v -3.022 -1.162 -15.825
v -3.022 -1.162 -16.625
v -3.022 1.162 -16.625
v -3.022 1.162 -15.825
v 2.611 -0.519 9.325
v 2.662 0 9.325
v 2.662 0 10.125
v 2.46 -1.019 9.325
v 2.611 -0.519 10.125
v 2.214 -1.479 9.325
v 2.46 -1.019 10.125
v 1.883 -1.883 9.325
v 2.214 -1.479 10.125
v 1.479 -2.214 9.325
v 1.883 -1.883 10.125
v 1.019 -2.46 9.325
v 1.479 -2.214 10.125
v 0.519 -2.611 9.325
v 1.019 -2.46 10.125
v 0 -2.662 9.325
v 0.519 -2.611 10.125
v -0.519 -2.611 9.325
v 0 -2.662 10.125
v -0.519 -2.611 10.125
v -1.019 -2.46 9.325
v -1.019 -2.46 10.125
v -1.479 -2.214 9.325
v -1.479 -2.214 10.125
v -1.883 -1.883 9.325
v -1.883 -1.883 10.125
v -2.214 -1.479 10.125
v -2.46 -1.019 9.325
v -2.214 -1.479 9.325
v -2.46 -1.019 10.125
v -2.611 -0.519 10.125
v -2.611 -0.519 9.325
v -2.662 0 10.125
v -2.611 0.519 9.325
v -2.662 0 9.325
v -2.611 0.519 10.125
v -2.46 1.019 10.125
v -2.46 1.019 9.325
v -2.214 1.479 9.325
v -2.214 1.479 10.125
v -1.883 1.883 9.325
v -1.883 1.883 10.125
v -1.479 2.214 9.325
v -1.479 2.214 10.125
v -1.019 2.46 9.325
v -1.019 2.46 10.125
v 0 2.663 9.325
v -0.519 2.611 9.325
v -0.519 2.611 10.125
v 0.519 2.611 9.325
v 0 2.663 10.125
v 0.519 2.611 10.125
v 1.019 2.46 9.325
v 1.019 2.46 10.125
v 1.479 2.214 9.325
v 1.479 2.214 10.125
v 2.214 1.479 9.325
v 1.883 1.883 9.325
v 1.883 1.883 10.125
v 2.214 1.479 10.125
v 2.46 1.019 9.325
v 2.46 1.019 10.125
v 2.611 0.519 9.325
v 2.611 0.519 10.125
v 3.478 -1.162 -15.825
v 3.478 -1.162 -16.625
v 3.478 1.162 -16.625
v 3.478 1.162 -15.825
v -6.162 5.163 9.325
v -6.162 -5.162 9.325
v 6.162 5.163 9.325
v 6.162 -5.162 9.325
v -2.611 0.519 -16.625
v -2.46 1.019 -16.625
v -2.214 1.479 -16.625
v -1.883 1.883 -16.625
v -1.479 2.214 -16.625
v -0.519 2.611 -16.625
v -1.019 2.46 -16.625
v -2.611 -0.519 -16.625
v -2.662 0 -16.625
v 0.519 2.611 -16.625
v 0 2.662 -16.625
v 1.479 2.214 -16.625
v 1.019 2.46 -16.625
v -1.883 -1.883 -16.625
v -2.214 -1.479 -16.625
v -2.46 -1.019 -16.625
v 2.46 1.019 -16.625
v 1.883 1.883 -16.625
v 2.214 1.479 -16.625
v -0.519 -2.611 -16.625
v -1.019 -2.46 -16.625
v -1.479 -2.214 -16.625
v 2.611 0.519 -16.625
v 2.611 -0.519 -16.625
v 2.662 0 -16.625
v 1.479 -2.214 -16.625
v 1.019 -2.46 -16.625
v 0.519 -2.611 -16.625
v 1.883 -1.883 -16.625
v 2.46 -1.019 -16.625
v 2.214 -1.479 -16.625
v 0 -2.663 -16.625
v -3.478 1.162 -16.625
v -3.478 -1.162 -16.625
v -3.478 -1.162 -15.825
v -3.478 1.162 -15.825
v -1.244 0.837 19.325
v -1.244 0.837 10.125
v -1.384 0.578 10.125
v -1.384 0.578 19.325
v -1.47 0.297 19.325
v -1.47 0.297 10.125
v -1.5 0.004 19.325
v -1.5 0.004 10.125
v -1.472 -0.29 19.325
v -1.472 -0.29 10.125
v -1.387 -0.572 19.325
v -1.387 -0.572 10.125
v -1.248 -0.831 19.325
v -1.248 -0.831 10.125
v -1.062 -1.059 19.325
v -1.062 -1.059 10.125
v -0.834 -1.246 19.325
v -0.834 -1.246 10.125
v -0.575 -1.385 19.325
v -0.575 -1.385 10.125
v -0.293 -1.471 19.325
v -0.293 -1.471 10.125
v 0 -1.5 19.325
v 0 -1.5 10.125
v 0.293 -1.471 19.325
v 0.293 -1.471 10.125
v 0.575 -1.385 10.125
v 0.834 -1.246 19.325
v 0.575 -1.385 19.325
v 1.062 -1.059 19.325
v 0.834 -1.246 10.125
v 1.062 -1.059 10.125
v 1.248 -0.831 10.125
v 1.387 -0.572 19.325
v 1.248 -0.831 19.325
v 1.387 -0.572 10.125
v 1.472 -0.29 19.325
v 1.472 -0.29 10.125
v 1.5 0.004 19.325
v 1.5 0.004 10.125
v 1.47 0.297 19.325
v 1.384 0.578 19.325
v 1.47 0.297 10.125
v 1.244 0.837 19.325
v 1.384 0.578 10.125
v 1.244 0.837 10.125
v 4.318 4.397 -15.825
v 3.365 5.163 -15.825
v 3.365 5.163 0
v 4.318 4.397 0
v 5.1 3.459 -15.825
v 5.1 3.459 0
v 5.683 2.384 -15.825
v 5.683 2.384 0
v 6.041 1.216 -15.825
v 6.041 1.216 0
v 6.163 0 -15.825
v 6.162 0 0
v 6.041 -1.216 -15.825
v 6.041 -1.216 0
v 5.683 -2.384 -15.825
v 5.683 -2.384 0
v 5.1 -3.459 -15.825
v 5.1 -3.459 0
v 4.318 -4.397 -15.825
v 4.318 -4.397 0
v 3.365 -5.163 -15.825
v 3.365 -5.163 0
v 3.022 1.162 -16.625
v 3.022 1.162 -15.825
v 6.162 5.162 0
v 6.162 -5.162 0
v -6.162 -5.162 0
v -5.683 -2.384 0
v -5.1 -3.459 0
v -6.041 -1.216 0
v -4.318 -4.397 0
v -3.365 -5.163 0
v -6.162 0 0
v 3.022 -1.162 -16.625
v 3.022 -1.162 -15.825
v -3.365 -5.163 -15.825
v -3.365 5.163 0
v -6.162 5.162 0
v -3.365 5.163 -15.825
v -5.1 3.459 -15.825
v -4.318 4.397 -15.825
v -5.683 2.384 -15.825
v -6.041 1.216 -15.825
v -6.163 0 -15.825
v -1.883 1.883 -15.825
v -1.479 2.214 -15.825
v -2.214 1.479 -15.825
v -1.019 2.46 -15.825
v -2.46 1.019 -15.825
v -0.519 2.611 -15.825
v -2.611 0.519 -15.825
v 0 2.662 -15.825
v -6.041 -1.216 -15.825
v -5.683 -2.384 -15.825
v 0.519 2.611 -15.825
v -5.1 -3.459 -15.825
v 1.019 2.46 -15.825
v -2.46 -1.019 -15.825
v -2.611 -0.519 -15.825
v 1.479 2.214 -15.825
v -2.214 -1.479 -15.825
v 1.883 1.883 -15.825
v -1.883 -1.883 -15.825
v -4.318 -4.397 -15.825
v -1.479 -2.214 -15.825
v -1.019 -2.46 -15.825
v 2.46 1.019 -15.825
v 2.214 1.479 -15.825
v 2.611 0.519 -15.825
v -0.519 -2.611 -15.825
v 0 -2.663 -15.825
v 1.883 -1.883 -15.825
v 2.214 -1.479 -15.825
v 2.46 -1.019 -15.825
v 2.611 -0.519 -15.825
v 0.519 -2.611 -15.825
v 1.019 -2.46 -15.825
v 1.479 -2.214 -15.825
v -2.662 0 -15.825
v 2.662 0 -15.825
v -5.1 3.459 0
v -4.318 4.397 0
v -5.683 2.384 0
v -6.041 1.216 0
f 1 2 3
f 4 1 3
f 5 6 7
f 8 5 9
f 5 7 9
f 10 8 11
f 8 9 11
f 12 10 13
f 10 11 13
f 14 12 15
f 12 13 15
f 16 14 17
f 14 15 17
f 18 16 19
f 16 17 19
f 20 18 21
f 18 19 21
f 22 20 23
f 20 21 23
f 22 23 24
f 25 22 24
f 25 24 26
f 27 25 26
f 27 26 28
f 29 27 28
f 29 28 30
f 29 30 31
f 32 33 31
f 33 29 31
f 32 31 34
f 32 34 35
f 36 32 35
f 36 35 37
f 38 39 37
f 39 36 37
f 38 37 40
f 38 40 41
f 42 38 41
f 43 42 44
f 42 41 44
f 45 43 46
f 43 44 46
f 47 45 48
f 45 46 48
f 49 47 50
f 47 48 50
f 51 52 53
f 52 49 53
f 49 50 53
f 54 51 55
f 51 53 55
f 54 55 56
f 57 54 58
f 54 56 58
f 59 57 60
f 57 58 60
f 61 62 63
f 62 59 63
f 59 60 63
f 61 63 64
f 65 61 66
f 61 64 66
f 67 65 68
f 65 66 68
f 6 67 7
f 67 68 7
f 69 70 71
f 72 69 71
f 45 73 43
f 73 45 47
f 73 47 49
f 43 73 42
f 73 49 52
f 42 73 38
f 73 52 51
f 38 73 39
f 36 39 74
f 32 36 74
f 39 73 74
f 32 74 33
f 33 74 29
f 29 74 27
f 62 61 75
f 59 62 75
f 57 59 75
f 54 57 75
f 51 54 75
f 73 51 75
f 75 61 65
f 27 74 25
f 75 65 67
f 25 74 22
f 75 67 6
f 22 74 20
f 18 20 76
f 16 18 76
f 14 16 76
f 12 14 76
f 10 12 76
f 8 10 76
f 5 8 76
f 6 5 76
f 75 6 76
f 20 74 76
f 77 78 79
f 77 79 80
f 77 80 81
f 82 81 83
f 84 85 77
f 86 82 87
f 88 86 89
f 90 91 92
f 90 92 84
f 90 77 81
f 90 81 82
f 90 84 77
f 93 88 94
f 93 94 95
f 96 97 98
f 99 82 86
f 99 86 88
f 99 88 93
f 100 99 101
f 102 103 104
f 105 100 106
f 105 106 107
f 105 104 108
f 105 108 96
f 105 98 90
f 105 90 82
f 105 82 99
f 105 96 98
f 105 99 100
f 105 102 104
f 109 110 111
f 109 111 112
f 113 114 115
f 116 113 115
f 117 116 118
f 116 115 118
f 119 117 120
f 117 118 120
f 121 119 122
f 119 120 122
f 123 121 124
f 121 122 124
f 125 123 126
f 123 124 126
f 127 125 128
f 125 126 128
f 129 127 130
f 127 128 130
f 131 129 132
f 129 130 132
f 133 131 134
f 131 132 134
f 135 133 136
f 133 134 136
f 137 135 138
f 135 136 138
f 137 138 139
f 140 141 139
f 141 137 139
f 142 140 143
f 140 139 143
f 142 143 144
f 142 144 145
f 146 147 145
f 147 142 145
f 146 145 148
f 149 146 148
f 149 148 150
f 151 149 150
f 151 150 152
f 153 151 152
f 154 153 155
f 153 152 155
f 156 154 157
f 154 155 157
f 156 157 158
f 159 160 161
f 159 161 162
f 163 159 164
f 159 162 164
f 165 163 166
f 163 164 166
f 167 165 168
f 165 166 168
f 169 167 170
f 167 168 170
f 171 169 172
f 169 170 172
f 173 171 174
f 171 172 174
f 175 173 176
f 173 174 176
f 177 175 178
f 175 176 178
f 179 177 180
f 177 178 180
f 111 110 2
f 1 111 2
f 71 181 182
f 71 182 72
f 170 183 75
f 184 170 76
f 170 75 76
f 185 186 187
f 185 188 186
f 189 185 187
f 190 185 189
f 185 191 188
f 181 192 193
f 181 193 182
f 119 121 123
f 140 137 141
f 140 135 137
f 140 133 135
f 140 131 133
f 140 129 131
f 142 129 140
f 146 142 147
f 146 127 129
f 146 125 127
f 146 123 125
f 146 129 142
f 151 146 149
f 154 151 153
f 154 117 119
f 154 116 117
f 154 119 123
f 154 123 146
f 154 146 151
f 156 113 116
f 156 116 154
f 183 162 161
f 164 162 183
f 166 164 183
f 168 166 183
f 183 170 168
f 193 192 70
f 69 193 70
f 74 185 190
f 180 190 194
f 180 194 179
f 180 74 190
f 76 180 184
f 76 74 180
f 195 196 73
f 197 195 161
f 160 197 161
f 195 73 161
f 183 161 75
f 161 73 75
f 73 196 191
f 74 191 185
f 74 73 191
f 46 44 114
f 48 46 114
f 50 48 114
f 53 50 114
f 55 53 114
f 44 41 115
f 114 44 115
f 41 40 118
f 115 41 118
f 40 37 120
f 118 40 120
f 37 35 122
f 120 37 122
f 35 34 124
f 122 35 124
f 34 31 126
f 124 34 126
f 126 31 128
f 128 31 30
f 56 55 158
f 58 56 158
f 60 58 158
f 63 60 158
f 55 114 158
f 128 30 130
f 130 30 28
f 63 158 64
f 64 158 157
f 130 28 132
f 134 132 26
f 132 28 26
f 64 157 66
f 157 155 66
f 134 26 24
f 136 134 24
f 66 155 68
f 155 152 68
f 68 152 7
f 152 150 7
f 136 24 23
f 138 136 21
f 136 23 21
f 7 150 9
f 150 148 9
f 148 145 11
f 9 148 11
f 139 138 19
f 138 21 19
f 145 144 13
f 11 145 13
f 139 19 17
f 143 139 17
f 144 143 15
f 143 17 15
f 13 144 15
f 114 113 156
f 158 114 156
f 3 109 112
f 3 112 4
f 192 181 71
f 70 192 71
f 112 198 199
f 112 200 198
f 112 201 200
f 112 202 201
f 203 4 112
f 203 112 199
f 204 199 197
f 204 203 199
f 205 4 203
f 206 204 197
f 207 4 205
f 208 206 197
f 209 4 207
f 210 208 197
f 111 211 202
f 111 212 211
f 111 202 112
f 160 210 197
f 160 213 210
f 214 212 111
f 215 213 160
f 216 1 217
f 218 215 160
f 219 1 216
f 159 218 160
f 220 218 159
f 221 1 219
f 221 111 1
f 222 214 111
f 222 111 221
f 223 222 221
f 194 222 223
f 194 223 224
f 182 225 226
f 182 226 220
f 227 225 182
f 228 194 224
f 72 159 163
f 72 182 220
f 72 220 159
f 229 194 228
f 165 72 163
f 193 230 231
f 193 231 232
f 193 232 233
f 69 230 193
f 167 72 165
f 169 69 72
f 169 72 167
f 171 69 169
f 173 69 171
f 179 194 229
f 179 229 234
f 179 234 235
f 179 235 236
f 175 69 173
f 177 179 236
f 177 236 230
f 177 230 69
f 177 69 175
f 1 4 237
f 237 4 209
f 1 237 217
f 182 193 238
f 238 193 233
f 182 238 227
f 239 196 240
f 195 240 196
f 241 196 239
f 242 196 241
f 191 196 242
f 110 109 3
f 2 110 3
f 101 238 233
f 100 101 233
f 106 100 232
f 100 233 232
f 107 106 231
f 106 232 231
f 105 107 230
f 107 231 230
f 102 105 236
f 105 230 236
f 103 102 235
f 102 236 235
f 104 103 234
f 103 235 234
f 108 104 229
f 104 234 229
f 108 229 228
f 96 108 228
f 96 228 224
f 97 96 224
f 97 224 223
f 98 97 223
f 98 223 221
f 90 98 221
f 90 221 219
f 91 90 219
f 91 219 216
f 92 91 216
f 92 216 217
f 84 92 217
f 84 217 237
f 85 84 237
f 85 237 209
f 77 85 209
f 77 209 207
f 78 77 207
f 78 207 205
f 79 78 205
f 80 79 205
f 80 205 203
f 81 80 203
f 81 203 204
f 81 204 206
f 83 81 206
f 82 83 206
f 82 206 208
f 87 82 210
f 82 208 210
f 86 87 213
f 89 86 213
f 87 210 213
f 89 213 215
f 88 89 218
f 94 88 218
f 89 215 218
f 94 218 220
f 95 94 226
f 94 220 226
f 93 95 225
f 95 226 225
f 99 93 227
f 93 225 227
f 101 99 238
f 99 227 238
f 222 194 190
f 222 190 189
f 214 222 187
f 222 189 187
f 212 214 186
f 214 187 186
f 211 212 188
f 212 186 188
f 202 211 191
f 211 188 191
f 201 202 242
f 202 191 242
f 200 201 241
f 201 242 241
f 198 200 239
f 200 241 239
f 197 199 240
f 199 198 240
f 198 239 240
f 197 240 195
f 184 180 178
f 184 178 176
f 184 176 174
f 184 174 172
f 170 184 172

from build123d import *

# Parameters (mm, degrees)
BOX003_W               = 3.325
BOX003_H               = 3.325
BOX003_DEPTH           = 19.325
CYLINDER002_R          = 1.5
CYLINDER002_DEPTH      = 19.325
BOX005_W               = 0.455
BOX005_H               = 2.325
BOX005_DEPTH           = 16.625
BOX004_W               = 0.455
BOX004_H               = 2.325
BOX004_DEPTH           = 16.625
CYLINDER001_R          = 2.6625
CYLINDER001_DEPTH      = 26.75
CYLINDER_R             = 6.1625
CYLINDER_DEPTH         = 15.825
BOX_W                  = 12.325
BOX_H                  = 10.325
BOX_DEPTH              = 15.825
BOX002_W               = 12.325
BOX002_H               = 10.325
BOX002_DEPTH           = 9.325
FUSION_PLACEMENT_ANGLE = 180


with BuildPart() as cube003:
    # Box003 → Box003 (new body)
    with BuildSketch(Plane(origin=(-1.6625, 0.8375, 0), x_dir=(1, 0, 0), z_dir=(0, 0, 1))):
        with Locations((1.6625, 1.6625)):
            Rectangle(BOX003_W, BOX003_H)
    extrude(amount=BOX003_DEPTH)


with BuildPart() as shaft:
    # Cylinder002 → Cylinder002 (new body)
    with BuildSketch(Plane.XY):
        Circle(CYLINDER002_R)
    extrude(amount=CYLINDER002_DEPTH)

    # Cut: cut Cube003
    add(cube003.part, mode=Mode.SUBTRACT)


with BuildPart() as cube005:
    # Box005 → Box005 (new body)
    with BuildSketch(Plane(origin=(-3.4775, -1.1625, -16.625), x_dir=(1, 0, 0), z_dir=(0, 0, 1))):
        with Locations((0.2275, 1.1625)):
            Rectangle(BOX005_W, BOX005_H)
    extrude(amount=BOX005_DEPTH)


with BuildPart() as contacts:
    # Box004 → Box004 (new body)
    with BuildSketch(Plane(origin=(3.0225, -1.1625, -16.625), x_dir=(1, 0, 0), z_dir=(0, 0, 1))):
        with Locations((0.2275, 1.1625)):
            Rectangle(BOX004_W, BOX004_H)
    extrude(amount=BOX004_DEPTH)

    # Fusion001: union Cube005
    add(cube005.part)


with BuildPart() as cylinder001:
    # Cylinder001 → Cylinder001 (new body)
    with BuildSketch(Plane.XY.offset(-10.125)):
        Circle(CYLINDER001_R)
    extrude(amount=CYLINDER001_DEPTH)


with BuildPart() as cylinder:
    # Cylinder → Cylinder (new body)
    with BuildSketch(Plane.XY):
        Circle(CYLINDER_R)
    extrude(amount=CYLINDER_DEPTH)


with BuildPart() as common:
    # Box → Box (new body)
    with BuildSketch(Plane(origin=(-6.1625, -5.1625, 0), x_dir=(1, 0, 0), z_dir=(0, 0, 1))):
        with Locations((6.1625, 5.1625)):
            Rectangle(BOX_W, BOX_H)
    extrude(amount=BOX_DEPTH)

    # Common: intersect Cylinder
    add(cylinder.part, mode=Mode.INTERSECT)


with BuildPart() as n20gearedmotor:
    # Box002 → Box002 (new body)
    with BuildSketch(Plane(origin=(-6.1625, -5.1625, -9.325), x_dir=(1, 0, 0), z_dir=(0, 0, 1))):
        with Locations((6.1625, 5.1625)):
            Rectangle(BOX002_W, BOX002_H)
    extrude(amount=BOX002_DEPTH)

    # Fusion: union Cylinder001, Common
    add(cylinder001.part)
    add(common.part)


with BuildPart() as n20gearedmotor_1:
    # Fusion placement: moved
    add(n20gearedmotor.part.rotate(Axis((0, 0, 0), (1, 0, 0)), FUSION_PLACEMENT_ANGLE))

    # Fusion002: union Shaft, Contacts
    add(shaft.part)
    add(contacts.part)


solid = n20gearedmotor_1.part
